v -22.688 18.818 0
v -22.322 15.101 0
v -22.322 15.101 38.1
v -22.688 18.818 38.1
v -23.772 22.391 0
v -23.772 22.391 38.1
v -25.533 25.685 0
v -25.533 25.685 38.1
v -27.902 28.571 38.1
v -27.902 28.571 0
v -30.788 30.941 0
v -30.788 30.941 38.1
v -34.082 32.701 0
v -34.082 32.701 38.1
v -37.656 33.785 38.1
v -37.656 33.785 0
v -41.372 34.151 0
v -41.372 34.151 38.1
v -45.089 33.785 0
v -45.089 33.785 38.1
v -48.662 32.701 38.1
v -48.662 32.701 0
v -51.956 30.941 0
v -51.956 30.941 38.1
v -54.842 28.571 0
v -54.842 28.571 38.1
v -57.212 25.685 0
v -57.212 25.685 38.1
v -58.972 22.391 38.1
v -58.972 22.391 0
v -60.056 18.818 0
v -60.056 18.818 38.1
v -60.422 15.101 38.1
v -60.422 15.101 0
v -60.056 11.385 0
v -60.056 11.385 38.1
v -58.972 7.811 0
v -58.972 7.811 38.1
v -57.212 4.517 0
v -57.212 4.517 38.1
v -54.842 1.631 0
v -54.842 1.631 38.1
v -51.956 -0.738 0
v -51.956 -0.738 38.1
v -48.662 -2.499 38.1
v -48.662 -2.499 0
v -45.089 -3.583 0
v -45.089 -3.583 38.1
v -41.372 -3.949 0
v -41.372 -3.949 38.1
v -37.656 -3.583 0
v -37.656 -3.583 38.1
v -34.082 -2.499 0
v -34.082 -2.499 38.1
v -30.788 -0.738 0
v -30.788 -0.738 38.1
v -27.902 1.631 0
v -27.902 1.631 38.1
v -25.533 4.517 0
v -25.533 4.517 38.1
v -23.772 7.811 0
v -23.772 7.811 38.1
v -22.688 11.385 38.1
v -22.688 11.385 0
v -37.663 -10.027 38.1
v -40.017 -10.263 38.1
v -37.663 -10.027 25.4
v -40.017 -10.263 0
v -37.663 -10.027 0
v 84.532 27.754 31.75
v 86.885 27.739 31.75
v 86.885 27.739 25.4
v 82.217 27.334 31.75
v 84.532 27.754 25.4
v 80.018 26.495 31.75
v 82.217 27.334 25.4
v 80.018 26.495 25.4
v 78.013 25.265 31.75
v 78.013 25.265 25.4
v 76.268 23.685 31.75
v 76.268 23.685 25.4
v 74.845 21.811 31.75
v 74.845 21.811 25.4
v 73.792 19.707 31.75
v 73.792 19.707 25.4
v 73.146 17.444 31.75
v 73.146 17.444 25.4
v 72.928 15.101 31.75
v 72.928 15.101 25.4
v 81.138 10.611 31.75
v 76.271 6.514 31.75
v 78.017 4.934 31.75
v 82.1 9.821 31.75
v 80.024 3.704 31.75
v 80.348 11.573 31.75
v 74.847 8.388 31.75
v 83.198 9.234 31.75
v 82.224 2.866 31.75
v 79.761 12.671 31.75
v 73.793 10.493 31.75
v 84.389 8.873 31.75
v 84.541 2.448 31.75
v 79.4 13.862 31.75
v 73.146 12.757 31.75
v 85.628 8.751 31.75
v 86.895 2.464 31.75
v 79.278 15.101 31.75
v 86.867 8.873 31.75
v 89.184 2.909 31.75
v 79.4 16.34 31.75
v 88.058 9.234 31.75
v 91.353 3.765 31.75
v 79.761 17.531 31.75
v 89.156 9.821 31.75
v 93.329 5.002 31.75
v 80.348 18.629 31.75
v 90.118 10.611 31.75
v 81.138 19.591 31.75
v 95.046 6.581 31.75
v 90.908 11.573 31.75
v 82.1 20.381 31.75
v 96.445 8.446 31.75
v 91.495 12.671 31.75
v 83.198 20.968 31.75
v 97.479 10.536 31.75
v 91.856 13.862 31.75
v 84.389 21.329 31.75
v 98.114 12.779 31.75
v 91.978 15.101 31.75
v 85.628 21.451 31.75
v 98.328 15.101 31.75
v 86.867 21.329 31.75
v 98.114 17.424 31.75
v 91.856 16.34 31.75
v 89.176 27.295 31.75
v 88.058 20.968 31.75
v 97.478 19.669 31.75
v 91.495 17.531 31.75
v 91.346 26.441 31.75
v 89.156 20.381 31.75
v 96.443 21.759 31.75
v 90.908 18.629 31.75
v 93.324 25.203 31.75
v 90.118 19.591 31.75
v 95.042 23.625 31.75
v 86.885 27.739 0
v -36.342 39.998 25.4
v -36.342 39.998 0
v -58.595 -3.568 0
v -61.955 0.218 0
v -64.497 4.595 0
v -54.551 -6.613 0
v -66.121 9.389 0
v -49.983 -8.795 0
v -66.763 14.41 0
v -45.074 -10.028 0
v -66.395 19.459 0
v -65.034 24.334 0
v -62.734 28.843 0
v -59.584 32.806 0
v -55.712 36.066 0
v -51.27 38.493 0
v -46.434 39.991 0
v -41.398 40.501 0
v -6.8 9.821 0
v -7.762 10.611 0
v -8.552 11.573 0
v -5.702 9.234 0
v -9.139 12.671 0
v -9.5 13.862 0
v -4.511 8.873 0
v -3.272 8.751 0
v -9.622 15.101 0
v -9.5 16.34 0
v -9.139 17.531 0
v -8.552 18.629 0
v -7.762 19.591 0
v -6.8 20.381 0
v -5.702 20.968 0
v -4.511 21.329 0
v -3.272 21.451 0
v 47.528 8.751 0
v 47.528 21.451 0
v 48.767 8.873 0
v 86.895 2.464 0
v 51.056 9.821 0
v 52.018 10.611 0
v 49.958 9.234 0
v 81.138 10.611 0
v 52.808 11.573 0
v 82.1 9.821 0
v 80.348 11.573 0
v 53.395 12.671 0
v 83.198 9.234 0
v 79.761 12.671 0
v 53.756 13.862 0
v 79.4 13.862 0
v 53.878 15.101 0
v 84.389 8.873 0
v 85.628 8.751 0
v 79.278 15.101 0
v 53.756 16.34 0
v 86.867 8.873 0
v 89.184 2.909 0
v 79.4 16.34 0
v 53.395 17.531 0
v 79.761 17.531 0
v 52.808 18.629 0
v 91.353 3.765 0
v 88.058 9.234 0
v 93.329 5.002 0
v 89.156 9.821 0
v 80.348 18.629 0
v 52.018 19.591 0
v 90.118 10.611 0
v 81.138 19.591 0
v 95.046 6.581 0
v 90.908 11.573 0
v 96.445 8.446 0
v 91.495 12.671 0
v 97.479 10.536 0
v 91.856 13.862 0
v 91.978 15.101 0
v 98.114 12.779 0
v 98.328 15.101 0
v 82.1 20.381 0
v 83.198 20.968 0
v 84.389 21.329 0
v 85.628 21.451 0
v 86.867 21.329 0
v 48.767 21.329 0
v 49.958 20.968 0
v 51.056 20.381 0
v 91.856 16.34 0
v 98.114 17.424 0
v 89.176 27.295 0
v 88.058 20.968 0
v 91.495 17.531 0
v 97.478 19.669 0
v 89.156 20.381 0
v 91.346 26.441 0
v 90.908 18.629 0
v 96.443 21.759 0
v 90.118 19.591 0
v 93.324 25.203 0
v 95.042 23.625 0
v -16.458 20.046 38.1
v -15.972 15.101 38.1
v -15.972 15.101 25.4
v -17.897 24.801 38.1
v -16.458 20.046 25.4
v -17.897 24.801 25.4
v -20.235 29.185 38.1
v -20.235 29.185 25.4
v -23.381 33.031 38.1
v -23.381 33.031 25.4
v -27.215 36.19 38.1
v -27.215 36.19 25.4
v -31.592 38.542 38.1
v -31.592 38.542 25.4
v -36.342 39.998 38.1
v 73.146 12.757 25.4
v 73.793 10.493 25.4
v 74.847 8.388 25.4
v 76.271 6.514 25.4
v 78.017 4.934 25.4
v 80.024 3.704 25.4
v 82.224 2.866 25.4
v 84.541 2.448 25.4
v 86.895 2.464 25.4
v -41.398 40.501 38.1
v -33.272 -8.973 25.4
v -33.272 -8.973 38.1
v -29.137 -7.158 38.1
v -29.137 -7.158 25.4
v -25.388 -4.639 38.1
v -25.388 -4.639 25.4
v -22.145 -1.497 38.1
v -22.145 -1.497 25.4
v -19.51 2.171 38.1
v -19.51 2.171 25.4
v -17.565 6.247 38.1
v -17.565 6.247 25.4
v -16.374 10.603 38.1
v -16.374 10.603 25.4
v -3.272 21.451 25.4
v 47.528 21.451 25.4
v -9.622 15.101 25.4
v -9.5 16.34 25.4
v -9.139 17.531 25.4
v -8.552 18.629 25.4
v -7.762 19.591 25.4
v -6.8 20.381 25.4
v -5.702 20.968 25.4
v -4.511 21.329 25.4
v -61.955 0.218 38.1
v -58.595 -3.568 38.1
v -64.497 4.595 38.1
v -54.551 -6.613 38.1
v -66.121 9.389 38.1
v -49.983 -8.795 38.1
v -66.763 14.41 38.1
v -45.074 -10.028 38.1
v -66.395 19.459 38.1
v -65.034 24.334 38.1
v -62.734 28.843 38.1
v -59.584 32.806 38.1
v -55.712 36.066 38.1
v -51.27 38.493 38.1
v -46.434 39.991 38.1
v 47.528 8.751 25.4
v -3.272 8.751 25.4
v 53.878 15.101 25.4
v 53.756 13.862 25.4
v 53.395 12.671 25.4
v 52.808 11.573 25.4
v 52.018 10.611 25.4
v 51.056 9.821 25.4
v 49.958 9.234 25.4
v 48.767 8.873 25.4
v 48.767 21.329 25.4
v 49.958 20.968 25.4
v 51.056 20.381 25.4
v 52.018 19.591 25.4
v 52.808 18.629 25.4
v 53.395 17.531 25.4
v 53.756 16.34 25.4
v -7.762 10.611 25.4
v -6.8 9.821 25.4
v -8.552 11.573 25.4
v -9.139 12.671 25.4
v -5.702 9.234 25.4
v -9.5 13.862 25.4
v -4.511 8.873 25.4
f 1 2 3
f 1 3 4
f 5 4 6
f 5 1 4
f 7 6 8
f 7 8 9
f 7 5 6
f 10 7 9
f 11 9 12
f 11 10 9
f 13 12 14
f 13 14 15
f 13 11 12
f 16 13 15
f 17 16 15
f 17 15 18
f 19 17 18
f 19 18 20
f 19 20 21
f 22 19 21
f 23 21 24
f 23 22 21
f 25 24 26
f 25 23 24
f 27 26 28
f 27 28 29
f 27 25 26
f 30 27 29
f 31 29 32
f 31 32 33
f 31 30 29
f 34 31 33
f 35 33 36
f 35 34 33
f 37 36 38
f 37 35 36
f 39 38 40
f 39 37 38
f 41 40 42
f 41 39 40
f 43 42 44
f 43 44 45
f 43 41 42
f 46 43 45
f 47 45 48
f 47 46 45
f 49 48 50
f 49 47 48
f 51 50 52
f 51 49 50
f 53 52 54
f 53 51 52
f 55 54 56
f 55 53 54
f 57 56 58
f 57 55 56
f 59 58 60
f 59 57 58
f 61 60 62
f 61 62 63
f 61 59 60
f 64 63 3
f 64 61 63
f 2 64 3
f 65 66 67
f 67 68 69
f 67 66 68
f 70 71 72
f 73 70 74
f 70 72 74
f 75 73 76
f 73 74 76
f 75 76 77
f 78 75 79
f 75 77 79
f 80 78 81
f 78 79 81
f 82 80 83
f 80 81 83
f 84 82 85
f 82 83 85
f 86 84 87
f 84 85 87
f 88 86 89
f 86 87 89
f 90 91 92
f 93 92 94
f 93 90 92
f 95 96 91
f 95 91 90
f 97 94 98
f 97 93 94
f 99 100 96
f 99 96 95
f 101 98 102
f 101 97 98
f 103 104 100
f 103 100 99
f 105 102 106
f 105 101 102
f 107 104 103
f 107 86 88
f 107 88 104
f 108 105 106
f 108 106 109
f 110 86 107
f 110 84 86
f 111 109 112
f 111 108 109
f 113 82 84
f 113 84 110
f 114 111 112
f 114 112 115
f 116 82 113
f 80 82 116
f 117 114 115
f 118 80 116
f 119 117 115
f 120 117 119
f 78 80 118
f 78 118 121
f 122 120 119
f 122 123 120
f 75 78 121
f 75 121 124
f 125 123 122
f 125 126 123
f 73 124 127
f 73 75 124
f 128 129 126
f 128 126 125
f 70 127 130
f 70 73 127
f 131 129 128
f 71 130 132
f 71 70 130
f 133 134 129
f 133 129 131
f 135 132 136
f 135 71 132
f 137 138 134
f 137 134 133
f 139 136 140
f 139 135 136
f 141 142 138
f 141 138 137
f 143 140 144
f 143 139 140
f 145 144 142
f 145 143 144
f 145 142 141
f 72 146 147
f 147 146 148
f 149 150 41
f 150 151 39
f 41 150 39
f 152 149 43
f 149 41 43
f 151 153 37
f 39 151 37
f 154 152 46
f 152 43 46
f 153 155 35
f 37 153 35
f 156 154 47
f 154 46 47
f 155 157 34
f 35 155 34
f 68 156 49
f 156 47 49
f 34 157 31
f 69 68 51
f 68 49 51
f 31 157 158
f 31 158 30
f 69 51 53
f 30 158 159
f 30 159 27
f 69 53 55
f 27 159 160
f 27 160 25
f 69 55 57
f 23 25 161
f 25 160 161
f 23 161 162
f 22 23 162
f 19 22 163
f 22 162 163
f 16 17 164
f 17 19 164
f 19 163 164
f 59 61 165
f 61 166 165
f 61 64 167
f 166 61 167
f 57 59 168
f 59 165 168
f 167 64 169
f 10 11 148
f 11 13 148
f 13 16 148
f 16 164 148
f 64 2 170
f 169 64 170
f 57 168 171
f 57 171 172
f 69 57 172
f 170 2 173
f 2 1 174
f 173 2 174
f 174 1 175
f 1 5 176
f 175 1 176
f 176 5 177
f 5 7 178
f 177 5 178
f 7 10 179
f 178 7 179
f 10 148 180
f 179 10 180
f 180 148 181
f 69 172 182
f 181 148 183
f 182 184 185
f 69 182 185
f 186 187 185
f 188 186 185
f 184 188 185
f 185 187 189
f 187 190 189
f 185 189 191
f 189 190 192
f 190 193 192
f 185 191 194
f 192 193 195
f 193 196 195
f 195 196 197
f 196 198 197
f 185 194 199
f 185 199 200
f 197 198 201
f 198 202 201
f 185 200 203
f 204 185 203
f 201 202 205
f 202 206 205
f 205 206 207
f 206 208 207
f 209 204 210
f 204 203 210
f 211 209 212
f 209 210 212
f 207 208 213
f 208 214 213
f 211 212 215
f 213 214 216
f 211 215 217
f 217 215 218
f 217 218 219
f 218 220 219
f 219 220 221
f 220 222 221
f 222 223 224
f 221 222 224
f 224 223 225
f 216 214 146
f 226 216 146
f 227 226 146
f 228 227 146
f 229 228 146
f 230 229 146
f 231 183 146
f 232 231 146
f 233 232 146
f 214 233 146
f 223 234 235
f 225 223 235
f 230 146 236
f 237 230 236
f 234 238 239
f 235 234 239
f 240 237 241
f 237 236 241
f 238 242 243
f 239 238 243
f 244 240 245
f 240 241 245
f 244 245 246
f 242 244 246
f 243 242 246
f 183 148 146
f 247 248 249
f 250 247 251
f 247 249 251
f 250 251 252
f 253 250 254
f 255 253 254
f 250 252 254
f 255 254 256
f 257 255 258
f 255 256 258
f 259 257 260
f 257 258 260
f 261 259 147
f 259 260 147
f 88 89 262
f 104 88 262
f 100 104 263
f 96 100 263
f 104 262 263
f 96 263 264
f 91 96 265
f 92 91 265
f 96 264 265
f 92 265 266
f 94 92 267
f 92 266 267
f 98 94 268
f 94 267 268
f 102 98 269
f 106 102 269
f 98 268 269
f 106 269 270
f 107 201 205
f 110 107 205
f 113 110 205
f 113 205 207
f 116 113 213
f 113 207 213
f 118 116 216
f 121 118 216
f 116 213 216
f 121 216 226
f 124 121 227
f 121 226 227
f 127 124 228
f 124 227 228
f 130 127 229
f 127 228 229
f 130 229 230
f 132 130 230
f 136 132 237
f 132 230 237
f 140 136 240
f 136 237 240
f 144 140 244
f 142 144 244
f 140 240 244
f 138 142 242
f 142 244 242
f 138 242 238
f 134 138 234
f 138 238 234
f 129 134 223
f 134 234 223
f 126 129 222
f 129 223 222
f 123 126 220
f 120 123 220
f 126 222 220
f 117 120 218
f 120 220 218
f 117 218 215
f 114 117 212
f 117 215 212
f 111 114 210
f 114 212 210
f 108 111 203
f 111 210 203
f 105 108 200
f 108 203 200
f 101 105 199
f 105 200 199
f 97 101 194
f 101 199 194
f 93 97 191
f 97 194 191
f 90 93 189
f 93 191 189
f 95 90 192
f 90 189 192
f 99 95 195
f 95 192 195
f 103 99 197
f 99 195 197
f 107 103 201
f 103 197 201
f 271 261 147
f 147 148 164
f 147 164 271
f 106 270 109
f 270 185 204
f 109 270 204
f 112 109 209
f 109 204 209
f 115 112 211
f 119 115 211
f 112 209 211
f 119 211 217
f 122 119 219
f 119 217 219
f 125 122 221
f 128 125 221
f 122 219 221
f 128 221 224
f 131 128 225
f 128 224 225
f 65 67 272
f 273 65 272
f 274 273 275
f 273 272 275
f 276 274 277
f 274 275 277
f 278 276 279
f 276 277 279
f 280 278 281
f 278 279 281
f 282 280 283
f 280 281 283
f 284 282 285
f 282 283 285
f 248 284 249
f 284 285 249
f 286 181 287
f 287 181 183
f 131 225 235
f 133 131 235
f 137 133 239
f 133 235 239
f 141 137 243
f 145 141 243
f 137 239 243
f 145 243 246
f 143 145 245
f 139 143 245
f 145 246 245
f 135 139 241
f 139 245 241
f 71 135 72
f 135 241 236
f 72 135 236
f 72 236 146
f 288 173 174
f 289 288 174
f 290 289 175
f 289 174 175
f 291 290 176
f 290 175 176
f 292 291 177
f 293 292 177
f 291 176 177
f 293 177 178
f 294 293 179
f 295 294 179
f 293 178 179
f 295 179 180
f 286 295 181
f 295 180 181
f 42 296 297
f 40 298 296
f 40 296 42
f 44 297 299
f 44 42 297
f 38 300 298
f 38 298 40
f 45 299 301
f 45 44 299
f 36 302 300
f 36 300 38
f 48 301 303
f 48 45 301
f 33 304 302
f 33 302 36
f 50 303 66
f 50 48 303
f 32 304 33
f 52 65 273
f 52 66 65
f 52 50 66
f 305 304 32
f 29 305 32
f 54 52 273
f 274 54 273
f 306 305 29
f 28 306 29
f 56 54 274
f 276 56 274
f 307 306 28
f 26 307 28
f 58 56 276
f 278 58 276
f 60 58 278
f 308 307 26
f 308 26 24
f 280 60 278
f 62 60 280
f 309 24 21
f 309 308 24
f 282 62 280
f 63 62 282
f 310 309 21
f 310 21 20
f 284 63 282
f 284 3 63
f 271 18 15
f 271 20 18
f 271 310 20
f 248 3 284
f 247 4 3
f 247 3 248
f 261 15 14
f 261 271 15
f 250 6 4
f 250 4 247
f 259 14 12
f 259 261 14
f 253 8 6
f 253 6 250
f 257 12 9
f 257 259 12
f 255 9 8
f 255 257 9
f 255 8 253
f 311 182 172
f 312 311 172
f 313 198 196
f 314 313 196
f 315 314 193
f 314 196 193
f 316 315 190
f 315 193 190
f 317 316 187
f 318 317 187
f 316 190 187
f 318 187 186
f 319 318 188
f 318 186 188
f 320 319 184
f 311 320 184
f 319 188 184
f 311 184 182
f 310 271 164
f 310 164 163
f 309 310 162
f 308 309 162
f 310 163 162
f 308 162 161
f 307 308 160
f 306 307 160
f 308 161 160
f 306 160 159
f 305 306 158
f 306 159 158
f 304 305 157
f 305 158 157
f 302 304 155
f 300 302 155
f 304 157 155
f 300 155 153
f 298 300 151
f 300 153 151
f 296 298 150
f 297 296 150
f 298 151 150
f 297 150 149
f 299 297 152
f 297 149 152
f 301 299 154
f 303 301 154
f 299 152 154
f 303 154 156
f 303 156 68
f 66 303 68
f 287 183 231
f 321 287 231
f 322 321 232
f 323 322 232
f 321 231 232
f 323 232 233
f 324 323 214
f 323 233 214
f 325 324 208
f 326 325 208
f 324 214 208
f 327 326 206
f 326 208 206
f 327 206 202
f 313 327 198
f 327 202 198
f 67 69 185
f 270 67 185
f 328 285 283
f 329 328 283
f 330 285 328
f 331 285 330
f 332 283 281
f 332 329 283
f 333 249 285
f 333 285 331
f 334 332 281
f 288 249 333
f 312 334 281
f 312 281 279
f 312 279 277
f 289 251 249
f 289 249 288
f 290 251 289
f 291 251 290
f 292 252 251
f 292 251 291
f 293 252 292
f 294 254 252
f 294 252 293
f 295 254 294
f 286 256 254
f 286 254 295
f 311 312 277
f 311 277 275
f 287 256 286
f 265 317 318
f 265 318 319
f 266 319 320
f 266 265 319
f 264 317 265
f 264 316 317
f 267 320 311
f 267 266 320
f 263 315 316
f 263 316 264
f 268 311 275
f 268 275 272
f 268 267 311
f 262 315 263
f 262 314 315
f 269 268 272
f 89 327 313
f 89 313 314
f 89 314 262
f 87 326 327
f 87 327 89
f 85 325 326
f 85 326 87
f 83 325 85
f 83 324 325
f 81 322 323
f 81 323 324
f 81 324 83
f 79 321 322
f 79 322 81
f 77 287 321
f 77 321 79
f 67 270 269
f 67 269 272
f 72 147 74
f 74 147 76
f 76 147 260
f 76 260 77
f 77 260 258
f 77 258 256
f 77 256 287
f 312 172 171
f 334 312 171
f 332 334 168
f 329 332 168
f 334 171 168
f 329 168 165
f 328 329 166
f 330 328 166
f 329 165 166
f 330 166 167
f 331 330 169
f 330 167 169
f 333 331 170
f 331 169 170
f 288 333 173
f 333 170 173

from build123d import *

# Parameters (mm, degrees)
F0_R     = 19.05
F1_DEPTH = 38.1
F2_DEPTH = 25.4
F3_DEPTH = 31.75


with BuildPart() as f1:
    # F0 (on Top) → F1 (new body)
    with BuildSketch(Plane.XY):
        with BuildLine():
            ThreePointArc((-37.6632987603, -10.0267366713), (-22.1449503188, -1.4965177663), (-15.972041403, 15.1010413445))
            ThreePointArc((-15.972041403, 15.1010413445), (-21.7134087863, 31.1851379508), (-36.3419755478, 39.9979977347))
            Line((-36.3419755478, 39.9979977347), (-41.3982813704, 40.5010277907))
            ThreePointArc((-41.3982813704, 40.5010277907), (-66.762647964, 14.4103181957), (-40.0173078877, -10.2628049155))
            Line((-40.0173078877, -10.2628049155), (-37.6632987603, -10.0267366713))
        make_face()
        with Locations((-41.372041403, 15.1010413445)):
            Circle(F0_R, mode=Mode.SUBTRACT)
    extrude(amount=F1_DEPTH)

    # F0 (on Top) → F2 (join)
    with BuildSketch(Plane.XY):
        with BuildLine():
            ThreePointArc((-36.3419755478, 39.9979977347), (-21.7134087863, 31.1851379508), (-15.972041403, 15.1010413445))
            Line((-15.972041403, 15.1010413445), (-9.622041403, 15.1010413445))
            ThreePointArc((-9.622041403, 15.1010413445), (-7.7621694636, 19.5911694051), (-3.272041403, 21.4510413445))
            Line((-3.272041403, 21.4510413445), (47.527958597, 21.4510413445))
            ThreePointArc((47.527958597, 21.4510413445), (52.0180866575, 19.5911694051), (53.877958597, 15.1010413445))
            Line((53.877958597, 15.1010413445), (72.927958597, 15.1010413445))
            ThreePointArc((72.927958597, 15.1010413445), (77.1037936501, 24.5153183725), (86.8852203227, 27.7386555558))
            Line((86.8852203227, 27.7386555558), (-36.3419755478, 39.9979977347))
        make_face()
        with BuildLine():
            Line((-9.622041403, 15.1010413445), (-15.972041403, 15.1010413445))
            ThreePointArc((-15.972041403, 15.1010413445), (-22.1449503188, -1.4965177663), (-37.6632987603, -10.0267366713))
            Line((-37.6632987603, -10.0267366713), (86.8952026298, 2.4644242117))
            ThreePointArc((86.8952026298, 2.4644242117), (77.1075125763, 5.6833983481), (72.927958597, 15.1010413445))
            Line((72.927958597, 15.1010413445), (53.877958597, 15.1010413445))
            ThreePointArc((53.877958597, 15.1010413445), (52.0180866575, 10.610913284), (47.527958597, 8.7510413445))
            Line((47.527958597, 8.7510413445), (-3.272041403, 8.7510413445))
            ThreePointArc((-3.272041403, 8.7510413445), (-7.7621694636, 10.610913284), (-9.622041403, 15.1010413445))
        make_face()
    extrude(amount=F2_DEPTH)

    # F0 (on Top) → F3 (join)
    with BuildSketch(Plane.XY):
        with BuildLine():
            ThreePointArc((98.327958597, 15.1010413445), (95.0422356249, 23.6252062914), (86.8852203227, 27.7386555558))
            ThreePointArc((86.8852203227, 27.7386555558), (77.1037936501, 24.5153183725), (72.927958597, 15.1010413445))
            ThreePointArc((72.927958597, 15.1010413445), (77.1075125763, 5.6833983481), (86.8952026298, 2.4644242117))
            ThreePointArc((86.8952026298, 2.4644242117), (95.0456015934, 6.5805953238), (98.327958597, 15.1010413445))
        make_face()
        with BuildLine():
            ThreePointArc((91.977958597, 15.1010413445), (85.627958597, 8.7510413445), (79.277958597, 15.1010413445))
            ThreePointArc((79.277958597, 15.1010413445), (85.627958597, 21.4510413445), (91.977958597, 15.1010413445))
        make_face(mode=Mode.SUBTRACT)
    extrude(amount=F3_DEPTH)


solid = f1.part
